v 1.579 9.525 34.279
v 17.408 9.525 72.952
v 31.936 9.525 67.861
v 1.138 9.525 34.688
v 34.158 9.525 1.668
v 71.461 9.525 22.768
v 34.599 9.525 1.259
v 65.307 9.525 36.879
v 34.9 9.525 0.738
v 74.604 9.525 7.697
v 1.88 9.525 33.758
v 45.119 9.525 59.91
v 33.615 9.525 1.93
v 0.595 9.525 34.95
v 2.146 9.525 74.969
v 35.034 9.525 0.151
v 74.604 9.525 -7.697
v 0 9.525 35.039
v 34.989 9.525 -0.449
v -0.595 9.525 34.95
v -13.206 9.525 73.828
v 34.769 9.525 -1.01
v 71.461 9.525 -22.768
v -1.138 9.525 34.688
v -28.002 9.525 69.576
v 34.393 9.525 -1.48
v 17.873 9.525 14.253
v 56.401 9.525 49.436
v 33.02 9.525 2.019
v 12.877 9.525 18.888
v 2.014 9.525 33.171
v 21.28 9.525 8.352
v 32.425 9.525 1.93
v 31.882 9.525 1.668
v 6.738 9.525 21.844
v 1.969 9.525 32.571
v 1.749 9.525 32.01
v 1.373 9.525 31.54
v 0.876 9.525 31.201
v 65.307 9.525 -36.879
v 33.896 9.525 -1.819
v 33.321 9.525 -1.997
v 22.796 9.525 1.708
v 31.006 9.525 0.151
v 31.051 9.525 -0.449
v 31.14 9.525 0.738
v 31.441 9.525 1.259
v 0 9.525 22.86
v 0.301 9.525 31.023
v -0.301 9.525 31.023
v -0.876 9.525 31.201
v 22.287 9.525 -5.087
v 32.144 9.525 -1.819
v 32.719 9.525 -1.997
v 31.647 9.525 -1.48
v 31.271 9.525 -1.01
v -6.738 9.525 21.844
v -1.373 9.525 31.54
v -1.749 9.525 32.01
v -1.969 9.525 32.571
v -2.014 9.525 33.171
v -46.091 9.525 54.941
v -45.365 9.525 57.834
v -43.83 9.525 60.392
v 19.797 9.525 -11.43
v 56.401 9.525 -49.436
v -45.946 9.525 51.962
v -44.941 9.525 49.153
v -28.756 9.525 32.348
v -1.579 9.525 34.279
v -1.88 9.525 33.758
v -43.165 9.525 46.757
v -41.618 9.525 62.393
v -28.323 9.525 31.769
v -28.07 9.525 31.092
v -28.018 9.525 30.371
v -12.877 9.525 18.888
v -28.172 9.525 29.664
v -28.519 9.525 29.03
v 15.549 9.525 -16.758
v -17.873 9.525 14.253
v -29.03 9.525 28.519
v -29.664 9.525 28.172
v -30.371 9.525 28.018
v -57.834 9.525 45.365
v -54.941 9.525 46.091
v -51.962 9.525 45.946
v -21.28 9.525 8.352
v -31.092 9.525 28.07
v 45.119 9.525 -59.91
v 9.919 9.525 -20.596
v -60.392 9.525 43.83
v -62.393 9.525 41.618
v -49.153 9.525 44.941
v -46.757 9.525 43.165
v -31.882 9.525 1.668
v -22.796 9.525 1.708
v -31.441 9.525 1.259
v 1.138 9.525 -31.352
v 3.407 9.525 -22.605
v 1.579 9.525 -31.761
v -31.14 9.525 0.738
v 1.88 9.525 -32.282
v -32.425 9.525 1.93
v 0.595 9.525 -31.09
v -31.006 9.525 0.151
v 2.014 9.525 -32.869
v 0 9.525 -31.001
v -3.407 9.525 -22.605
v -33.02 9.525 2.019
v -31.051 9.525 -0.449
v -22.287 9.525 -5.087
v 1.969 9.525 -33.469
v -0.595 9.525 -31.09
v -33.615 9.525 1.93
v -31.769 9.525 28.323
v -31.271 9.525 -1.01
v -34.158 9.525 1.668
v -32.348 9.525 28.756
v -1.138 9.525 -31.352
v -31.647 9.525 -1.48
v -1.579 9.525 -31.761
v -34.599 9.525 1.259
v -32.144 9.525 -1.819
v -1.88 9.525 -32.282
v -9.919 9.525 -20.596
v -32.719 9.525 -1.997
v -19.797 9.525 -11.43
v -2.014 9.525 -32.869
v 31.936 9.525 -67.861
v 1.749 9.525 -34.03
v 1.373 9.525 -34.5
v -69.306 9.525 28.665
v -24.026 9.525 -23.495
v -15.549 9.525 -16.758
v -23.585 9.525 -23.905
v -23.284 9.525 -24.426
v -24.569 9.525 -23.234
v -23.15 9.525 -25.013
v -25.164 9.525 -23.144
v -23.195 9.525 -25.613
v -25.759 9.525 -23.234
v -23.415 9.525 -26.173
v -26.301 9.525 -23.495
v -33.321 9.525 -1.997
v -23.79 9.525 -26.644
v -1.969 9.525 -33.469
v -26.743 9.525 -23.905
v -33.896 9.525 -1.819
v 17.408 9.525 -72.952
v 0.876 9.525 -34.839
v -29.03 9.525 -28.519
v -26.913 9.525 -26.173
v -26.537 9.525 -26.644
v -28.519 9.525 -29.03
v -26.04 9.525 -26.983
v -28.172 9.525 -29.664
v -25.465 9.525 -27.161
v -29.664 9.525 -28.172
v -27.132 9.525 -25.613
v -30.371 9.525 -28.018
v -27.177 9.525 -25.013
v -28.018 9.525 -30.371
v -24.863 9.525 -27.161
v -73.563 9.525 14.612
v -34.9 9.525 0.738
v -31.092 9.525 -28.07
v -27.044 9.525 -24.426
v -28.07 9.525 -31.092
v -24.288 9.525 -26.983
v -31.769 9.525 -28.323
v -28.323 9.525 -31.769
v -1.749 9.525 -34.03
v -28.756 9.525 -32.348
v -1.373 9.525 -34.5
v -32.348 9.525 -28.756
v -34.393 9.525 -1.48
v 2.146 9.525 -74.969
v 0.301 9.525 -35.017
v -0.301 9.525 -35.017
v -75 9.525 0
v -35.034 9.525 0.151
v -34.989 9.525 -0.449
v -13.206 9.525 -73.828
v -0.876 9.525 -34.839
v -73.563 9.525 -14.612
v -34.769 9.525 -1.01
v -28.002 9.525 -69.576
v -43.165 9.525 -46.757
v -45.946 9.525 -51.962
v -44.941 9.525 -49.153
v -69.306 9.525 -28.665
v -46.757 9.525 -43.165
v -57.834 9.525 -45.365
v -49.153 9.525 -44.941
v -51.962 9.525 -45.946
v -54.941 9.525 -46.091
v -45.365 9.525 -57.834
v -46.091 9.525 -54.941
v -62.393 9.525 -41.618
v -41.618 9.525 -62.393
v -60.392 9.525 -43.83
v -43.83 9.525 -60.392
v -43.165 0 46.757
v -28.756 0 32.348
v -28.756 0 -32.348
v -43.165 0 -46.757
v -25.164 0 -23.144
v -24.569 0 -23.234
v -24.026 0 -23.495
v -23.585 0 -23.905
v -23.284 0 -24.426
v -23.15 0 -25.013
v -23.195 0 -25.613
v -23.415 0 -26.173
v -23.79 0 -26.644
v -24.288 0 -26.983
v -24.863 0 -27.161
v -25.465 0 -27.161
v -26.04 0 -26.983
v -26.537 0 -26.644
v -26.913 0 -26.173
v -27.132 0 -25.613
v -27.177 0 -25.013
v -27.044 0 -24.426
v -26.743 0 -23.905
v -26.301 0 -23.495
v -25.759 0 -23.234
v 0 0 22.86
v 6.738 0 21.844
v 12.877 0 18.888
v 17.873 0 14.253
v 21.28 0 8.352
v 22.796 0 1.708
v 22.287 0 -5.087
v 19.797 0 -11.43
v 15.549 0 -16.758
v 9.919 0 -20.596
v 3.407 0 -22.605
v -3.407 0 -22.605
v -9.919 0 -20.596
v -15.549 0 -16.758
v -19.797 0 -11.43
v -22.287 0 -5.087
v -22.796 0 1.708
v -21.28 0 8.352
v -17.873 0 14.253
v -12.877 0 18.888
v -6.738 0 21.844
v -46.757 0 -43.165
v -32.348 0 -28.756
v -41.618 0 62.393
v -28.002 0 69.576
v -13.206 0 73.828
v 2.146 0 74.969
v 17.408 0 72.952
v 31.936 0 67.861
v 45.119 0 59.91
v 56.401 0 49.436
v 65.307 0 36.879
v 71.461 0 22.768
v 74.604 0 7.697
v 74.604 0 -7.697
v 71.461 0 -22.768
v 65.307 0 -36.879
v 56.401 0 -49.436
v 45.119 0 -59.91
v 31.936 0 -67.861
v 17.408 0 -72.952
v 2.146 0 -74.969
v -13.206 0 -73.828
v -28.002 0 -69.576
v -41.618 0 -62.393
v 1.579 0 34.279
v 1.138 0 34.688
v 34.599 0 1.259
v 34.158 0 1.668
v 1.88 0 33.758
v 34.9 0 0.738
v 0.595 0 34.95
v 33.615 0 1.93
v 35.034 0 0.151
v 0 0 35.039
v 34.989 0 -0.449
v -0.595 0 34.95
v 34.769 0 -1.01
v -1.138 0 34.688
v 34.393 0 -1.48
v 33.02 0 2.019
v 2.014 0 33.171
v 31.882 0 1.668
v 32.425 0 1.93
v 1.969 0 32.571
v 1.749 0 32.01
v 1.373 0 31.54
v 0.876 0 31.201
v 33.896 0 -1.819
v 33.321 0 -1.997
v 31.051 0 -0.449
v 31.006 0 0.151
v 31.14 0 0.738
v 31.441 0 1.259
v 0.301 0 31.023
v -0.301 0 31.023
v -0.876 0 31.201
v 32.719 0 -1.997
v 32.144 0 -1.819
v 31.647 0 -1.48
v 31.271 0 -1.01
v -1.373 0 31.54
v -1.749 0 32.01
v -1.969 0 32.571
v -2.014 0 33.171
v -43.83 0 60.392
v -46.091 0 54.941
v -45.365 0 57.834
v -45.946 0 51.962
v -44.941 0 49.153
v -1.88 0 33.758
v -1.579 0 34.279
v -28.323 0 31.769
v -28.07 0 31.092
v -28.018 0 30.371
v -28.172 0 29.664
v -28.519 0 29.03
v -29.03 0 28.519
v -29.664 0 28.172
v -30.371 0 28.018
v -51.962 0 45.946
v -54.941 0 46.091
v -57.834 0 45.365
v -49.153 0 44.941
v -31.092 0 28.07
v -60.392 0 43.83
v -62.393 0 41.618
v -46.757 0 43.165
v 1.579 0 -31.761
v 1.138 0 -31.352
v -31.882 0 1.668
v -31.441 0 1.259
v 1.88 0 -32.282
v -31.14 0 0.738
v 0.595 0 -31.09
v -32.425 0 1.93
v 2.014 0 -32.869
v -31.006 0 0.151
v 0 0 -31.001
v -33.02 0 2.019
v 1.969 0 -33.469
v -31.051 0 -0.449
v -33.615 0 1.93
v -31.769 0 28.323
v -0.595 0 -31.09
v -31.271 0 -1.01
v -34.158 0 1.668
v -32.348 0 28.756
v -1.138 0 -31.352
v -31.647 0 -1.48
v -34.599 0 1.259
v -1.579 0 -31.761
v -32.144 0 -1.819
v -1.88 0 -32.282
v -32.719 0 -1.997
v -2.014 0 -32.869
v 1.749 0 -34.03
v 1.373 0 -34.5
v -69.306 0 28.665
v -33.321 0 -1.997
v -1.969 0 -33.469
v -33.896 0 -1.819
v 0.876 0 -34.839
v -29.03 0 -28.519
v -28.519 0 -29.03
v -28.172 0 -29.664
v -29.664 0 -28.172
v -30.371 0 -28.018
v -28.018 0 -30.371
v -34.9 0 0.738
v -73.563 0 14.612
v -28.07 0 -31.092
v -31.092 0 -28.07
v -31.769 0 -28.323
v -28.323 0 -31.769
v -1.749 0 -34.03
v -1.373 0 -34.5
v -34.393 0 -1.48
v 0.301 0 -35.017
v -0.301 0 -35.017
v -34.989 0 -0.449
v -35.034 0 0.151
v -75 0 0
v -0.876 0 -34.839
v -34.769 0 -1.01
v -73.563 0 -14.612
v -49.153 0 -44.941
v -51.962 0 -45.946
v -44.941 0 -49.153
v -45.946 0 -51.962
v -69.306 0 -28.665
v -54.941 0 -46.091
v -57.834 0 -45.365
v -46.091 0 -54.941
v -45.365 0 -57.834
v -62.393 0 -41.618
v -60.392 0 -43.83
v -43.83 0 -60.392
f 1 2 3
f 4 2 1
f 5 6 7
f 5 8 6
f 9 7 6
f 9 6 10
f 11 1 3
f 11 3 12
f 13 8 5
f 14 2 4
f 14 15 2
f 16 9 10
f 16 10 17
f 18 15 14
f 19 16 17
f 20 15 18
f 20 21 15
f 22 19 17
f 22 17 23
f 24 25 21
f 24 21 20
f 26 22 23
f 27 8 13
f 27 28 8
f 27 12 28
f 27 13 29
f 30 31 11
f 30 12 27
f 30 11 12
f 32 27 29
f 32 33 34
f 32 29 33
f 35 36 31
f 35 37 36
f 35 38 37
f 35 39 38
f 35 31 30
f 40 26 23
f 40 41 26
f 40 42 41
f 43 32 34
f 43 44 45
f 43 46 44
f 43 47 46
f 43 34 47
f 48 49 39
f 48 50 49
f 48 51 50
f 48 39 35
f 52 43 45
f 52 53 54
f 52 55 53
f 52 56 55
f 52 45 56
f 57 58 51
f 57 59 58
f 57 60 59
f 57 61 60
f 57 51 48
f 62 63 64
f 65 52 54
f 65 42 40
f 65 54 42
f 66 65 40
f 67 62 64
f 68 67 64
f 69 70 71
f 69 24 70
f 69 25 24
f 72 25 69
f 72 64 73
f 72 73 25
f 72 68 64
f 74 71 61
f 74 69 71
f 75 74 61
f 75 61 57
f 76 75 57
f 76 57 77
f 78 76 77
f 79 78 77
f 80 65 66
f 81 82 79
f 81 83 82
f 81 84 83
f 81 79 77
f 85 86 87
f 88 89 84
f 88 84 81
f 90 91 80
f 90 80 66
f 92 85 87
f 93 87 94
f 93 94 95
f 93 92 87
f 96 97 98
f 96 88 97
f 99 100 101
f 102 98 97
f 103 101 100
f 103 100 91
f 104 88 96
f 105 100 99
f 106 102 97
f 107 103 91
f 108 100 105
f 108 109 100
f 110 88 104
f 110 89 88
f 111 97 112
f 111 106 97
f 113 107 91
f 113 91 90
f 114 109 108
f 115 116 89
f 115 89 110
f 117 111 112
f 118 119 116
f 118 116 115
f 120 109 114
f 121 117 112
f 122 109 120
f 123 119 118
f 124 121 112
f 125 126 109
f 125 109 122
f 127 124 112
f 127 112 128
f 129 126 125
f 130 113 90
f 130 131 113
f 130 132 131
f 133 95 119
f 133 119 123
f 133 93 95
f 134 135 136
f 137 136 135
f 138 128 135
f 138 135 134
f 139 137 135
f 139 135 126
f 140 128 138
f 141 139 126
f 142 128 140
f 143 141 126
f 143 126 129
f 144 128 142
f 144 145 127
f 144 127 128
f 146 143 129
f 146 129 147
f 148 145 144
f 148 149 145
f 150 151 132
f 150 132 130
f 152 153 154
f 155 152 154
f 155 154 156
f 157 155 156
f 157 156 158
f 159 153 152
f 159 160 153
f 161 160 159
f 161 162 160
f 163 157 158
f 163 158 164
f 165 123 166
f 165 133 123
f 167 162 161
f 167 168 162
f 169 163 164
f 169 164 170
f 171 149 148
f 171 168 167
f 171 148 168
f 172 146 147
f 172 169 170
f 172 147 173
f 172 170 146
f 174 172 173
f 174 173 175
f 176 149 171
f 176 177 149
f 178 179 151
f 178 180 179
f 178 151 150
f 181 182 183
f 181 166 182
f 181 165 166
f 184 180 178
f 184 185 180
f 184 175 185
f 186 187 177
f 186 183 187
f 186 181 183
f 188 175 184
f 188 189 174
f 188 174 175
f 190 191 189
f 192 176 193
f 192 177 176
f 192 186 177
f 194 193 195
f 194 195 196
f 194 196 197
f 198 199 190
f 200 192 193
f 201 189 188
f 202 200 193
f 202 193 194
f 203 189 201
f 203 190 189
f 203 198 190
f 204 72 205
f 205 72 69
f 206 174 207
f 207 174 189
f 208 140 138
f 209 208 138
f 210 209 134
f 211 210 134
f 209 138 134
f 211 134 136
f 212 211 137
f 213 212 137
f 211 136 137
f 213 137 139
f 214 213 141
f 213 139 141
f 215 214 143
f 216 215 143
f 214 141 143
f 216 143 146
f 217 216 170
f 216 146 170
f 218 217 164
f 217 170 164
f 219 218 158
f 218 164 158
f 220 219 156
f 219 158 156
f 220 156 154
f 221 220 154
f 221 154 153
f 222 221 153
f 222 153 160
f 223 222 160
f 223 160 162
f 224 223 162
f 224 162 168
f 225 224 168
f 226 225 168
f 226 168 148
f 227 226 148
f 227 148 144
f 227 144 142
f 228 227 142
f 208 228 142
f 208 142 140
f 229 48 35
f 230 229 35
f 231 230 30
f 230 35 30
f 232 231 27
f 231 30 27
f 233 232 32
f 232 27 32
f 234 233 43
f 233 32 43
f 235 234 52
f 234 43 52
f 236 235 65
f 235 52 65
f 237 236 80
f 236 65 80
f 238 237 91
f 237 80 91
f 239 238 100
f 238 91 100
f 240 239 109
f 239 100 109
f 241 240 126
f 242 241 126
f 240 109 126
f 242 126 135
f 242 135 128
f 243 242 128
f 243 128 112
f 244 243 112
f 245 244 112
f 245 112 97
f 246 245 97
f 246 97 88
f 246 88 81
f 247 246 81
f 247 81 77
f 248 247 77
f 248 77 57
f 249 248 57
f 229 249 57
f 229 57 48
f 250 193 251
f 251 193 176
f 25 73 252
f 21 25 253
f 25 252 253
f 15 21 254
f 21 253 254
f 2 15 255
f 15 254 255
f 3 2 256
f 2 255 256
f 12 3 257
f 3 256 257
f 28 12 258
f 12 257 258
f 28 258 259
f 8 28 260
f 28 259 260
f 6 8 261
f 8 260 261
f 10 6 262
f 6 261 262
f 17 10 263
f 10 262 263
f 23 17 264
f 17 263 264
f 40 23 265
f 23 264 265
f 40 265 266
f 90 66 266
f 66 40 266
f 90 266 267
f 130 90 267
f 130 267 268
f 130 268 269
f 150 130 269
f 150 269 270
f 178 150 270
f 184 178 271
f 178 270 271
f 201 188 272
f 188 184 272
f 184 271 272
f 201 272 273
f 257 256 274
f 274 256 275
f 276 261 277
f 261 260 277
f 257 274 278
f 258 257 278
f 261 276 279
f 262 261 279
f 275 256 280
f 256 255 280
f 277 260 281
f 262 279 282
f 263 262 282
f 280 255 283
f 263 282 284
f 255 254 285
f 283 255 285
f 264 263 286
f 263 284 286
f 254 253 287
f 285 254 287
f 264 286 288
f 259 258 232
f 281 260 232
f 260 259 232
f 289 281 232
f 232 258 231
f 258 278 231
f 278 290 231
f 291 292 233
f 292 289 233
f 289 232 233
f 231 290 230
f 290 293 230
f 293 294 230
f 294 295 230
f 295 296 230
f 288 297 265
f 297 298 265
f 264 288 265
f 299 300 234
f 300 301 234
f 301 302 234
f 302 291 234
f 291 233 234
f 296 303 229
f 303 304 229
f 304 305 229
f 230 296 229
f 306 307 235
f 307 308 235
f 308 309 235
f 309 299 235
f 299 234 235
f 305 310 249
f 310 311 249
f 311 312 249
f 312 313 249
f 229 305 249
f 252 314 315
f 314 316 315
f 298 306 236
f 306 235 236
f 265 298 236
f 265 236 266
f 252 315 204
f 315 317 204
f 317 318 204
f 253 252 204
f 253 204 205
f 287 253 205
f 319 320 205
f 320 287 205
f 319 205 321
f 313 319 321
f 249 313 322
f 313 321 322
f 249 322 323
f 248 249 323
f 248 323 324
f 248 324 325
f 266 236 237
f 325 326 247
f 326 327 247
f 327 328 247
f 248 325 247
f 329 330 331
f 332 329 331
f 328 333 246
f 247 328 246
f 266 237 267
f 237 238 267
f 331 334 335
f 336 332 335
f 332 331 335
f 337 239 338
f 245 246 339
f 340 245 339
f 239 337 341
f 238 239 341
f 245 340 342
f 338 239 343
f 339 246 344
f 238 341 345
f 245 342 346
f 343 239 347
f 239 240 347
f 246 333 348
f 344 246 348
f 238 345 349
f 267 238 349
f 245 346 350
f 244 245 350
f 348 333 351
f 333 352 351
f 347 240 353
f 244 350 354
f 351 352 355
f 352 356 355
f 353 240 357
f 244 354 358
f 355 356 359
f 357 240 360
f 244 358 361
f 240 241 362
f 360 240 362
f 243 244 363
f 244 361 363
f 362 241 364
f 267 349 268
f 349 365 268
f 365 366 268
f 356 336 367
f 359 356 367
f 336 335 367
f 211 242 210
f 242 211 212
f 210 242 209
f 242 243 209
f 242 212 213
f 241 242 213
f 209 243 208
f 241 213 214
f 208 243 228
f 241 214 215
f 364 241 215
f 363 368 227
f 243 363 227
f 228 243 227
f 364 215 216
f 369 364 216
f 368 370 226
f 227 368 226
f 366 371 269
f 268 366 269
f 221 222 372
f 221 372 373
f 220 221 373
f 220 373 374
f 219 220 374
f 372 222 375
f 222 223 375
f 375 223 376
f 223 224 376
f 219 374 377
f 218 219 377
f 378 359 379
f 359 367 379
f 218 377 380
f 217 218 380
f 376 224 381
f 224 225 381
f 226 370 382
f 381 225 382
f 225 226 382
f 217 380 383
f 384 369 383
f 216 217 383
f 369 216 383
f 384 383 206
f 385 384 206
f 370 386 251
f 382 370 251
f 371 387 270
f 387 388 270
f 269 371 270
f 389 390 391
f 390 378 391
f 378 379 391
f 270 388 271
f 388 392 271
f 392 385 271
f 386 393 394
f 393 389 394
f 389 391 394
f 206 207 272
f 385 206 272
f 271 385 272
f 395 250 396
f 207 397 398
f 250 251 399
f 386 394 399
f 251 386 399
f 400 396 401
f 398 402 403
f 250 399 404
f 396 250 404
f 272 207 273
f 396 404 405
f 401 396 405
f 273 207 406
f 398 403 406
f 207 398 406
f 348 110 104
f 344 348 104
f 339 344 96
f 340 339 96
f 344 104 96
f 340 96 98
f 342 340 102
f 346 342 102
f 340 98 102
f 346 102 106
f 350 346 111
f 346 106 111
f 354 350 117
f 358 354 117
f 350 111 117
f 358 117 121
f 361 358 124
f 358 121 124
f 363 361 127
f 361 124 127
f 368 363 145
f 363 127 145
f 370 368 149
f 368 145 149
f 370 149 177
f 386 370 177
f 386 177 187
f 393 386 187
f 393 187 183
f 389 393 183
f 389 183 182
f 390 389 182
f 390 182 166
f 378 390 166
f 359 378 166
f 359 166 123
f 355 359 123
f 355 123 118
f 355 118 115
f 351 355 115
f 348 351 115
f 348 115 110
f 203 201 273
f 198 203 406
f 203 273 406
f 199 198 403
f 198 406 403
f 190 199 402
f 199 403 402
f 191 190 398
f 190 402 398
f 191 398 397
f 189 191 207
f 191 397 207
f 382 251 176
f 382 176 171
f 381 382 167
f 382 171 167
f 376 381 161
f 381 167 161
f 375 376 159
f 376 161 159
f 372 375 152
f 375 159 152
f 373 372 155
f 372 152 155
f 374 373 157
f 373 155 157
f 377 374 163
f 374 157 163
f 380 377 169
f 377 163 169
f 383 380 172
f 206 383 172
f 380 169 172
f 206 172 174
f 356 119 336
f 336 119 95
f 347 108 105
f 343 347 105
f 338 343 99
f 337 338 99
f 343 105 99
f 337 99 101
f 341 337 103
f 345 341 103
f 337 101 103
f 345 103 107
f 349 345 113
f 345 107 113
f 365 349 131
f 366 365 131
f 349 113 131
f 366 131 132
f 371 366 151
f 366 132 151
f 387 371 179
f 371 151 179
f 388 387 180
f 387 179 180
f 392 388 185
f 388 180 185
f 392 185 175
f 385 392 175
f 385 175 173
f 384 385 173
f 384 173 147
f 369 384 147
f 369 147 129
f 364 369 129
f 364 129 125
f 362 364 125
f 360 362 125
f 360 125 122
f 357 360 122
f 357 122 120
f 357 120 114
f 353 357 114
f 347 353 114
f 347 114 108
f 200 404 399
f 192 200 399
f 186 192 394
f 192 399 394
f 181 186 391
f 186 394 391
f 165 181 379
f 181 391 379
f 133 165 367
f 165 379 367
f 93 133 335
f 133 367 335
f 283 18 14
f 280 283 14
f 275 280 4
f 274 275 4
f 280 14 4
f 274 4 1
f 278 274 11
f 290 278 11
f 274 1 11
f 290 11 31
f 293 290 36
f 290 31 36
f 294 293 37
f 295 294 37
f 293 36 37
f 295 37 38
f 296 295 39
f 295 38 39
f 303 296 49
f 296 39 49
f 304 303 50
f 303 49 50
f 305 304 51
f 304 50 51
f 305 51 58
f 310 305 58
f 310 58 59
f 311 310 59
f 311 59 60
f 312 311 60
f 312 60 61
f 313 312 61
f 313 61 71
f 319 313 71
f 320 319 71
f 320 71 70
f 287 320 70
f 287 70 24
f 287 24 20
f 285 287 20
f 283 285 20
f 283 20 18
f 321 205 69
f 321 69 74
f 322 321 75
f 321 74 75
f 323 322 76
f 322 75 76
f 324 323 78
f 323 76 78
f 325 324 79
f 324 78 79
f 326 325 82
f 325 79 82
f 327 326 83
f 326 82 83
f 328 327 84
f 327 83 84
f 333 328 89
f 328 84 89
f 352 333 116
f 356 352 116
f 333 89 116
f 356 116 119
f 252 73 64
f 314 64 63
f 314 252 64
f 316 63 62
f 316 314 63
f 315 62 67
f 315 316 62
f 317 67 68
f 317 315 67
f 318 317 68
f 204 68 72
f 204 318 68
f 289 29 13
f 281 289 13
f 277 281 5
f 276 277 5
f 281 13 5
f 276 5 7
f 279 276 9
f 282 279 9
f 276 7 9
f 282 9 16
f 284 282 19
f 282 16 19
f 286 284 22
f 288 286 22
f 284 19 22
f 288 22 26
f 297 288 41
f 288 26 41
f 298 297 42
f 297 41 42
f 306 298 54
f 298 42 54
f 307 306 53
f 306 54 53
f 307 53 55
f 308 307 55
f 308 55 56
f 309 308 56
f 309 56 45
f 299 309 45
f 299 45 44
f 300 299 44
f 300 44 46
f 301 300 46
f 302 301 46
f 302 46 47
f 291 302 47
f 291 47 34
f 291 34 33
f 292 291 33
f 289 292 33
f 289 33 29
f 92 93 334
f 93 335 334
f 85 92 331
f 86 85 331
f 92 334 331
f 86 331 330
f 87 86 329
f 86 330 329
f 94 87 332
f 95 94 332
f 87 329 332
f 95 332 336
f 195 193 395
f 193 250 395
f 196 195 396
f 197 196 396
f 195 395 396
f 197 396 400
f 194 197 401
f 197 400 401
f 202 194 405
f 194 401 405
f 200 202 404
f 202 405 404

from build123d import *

# Parameters (mm, degrees)
SKETCH1_R           = 75
BOSS_EXTRUDE1_DEPTH = 9.525
CUT_EXTRUDE2_REACH  = 108.493
FILLET1_R           = 10.16
SKETCH39_R          = 22.86
SKETCH39_R_2        = 2.0193
CUT_EXTRUDE30_DEPTH = 247.31360274
SKETCH42_R          = 2.0193
CUT_EXTRUDE33_DEPTH = 247.31360274


with BuildPart() as part:
    # Sketch1 → Boss-Extrude1 (new body)
    with BuildSketch(Plane(origin=(0, 0, 0), x_dir=(1, 0, 0), z_dir=(0, 1, 0))):
        with Locations(Location((0, 0, 0), (0, 0, 90))):
            Circle(SKETCH1_R)
    extrude(amount=BOSS_EXTRUDE1_DEPTH)

    # Sketch11 → Cut-Extrude2 (cut, up to next)
    with BuildSketch(Plane(origin=(0, 9.525, 0), x_dir=(1, 0, 0), z_dir=(0, 1, 0)), mode=Mode.PRIVATE) as cut_extrude2_sk1:
        with BuildLine():
            Line((-54.798637954, 51.206535505), (-32.347997651, 28.755895202))
            ThreePointArc((-32.347997651, 28.755895202), (-28.755895202, 28.755895202), (-28.755895202, 32.347997651))
            Line((-28.755895202, 32.347997651), (-51.206535505, 54.798637954))
            ThreePointArc((-51.206535505, 54.798637954), (-53.033008589, 53.033008589), (-54.798637954, 51.206535505))
        make_face()
    cut_extrude2_tool1 = extrude(cut_extrude2_sk1.sketch, amount=-CUT_EXTRUDE2_REACH, mode=Mode.PRIVATE) & part.part
    # Sketch11 → Cut-Extrude2 (cut, up to next)
    with BuildSketch(Plane(origin=(0, 9.525, 0), x_dir=(1, 0, 0), z_dir=(0, 1, 0)), mode=Mode.PRIVATE) as cut_extrude2_sk2:
        with BuildLine():
            Line((-51.206535505, -54.798637954), (-28.755895202, -32.347997651))
            ThreePointArc((-28.755895202, -32.347997651), (-28.755895202, -28.755895202), (-32.347997651, -28.755895202))
            Line((-32.347997651, -28.755895202), (-54.798637954, -51.206535505))
            ThreePointArc((-54.798637954, -51.206535505), (-53.033008589, -53.033008589), (-51.206535505, -54.798637954))
        make_face()
    cut_extrude2_tool2 = extrude(cut_extrude2_sk2.sketch, amount=-CUT_EXTRUDE2_REACH, mode=Mode.PRIVATE) & part.part
    add(cut_extrude2_tool1.solids().sort_by_distance((-41.078737, 9.525, -41.078737))[0], mode=Mode.SUBTRACT)
    add(cut_extrude2_tool2.solids().sort_by_distance((-41.078737, 9.525, 41.078737))[0], mode=Mode.SUBTRACT)

    # Fillet1
    fillet1_edges = [part.edges().sort_by_distance(p)[0] for p in [
        (-51.206535505, 4.7625, 54.798637954),
        (-54.798637954, 4.7625, 51.206535505),
        (-54.798637954, 4.7625, -51.206535505),
        (-51.206535505, 4.7625, -54.798637954),
    ]]
    fillet(fillet1_edges, radius=FILLET1_R)

    # Sketch39 → Cut-Extrude30 (cut, through all)
    with BuildSketch(Plane(origin=(-73.768816189, 9.525, -121.080352405), x_dir=(1, 0, 0), z_dir=(0, 1, 0))):
        with Locations(Location((73.768816189, -121.080352405, 0), (0, 0, 270))):
            Circle(SKETCH39_R)
        with Locations(Location((73.768816189, -88.060352405, 0), (0, 0, 270))):
            Circle(SKETCH39_R_2)
        with Locations(Location((106.788816189, -121.080352405, 0), (0, 0, 270))):
            Circle(SKETCH39_R_2)
        with Locations(Location((73.768816189, -154.100352405, 0), (0, 0, 270))):
            Circle(SKETCH39_R_2)
        with Locations(Location((40.748816189, -121.080352405, 0), (0, 0, 270))):
            Circle(SKETCH39_R_2)
    extrude(amount=-CUT_EXTRUDE30_DEPTH, mode=Mode.SUBTRACT)

    # Sketch42 → Cut-Extrude33 (cut, through all)
    with BuildSketch(Plane(origin=(-73.768816189, 9.525, -121.080352405), x_dir=(1, 0, 0), z_dir=(0, 1, 0))):
        with Locations(Location((48.605023435, -95.916559651, 0), (0, 0, 270))):
            Circle(SKETCH42_R)
    extrude(amount=-CUT_EXTRUDE33_DEPTH, mode=Mode.SUBTRACT)


solid = part.part
